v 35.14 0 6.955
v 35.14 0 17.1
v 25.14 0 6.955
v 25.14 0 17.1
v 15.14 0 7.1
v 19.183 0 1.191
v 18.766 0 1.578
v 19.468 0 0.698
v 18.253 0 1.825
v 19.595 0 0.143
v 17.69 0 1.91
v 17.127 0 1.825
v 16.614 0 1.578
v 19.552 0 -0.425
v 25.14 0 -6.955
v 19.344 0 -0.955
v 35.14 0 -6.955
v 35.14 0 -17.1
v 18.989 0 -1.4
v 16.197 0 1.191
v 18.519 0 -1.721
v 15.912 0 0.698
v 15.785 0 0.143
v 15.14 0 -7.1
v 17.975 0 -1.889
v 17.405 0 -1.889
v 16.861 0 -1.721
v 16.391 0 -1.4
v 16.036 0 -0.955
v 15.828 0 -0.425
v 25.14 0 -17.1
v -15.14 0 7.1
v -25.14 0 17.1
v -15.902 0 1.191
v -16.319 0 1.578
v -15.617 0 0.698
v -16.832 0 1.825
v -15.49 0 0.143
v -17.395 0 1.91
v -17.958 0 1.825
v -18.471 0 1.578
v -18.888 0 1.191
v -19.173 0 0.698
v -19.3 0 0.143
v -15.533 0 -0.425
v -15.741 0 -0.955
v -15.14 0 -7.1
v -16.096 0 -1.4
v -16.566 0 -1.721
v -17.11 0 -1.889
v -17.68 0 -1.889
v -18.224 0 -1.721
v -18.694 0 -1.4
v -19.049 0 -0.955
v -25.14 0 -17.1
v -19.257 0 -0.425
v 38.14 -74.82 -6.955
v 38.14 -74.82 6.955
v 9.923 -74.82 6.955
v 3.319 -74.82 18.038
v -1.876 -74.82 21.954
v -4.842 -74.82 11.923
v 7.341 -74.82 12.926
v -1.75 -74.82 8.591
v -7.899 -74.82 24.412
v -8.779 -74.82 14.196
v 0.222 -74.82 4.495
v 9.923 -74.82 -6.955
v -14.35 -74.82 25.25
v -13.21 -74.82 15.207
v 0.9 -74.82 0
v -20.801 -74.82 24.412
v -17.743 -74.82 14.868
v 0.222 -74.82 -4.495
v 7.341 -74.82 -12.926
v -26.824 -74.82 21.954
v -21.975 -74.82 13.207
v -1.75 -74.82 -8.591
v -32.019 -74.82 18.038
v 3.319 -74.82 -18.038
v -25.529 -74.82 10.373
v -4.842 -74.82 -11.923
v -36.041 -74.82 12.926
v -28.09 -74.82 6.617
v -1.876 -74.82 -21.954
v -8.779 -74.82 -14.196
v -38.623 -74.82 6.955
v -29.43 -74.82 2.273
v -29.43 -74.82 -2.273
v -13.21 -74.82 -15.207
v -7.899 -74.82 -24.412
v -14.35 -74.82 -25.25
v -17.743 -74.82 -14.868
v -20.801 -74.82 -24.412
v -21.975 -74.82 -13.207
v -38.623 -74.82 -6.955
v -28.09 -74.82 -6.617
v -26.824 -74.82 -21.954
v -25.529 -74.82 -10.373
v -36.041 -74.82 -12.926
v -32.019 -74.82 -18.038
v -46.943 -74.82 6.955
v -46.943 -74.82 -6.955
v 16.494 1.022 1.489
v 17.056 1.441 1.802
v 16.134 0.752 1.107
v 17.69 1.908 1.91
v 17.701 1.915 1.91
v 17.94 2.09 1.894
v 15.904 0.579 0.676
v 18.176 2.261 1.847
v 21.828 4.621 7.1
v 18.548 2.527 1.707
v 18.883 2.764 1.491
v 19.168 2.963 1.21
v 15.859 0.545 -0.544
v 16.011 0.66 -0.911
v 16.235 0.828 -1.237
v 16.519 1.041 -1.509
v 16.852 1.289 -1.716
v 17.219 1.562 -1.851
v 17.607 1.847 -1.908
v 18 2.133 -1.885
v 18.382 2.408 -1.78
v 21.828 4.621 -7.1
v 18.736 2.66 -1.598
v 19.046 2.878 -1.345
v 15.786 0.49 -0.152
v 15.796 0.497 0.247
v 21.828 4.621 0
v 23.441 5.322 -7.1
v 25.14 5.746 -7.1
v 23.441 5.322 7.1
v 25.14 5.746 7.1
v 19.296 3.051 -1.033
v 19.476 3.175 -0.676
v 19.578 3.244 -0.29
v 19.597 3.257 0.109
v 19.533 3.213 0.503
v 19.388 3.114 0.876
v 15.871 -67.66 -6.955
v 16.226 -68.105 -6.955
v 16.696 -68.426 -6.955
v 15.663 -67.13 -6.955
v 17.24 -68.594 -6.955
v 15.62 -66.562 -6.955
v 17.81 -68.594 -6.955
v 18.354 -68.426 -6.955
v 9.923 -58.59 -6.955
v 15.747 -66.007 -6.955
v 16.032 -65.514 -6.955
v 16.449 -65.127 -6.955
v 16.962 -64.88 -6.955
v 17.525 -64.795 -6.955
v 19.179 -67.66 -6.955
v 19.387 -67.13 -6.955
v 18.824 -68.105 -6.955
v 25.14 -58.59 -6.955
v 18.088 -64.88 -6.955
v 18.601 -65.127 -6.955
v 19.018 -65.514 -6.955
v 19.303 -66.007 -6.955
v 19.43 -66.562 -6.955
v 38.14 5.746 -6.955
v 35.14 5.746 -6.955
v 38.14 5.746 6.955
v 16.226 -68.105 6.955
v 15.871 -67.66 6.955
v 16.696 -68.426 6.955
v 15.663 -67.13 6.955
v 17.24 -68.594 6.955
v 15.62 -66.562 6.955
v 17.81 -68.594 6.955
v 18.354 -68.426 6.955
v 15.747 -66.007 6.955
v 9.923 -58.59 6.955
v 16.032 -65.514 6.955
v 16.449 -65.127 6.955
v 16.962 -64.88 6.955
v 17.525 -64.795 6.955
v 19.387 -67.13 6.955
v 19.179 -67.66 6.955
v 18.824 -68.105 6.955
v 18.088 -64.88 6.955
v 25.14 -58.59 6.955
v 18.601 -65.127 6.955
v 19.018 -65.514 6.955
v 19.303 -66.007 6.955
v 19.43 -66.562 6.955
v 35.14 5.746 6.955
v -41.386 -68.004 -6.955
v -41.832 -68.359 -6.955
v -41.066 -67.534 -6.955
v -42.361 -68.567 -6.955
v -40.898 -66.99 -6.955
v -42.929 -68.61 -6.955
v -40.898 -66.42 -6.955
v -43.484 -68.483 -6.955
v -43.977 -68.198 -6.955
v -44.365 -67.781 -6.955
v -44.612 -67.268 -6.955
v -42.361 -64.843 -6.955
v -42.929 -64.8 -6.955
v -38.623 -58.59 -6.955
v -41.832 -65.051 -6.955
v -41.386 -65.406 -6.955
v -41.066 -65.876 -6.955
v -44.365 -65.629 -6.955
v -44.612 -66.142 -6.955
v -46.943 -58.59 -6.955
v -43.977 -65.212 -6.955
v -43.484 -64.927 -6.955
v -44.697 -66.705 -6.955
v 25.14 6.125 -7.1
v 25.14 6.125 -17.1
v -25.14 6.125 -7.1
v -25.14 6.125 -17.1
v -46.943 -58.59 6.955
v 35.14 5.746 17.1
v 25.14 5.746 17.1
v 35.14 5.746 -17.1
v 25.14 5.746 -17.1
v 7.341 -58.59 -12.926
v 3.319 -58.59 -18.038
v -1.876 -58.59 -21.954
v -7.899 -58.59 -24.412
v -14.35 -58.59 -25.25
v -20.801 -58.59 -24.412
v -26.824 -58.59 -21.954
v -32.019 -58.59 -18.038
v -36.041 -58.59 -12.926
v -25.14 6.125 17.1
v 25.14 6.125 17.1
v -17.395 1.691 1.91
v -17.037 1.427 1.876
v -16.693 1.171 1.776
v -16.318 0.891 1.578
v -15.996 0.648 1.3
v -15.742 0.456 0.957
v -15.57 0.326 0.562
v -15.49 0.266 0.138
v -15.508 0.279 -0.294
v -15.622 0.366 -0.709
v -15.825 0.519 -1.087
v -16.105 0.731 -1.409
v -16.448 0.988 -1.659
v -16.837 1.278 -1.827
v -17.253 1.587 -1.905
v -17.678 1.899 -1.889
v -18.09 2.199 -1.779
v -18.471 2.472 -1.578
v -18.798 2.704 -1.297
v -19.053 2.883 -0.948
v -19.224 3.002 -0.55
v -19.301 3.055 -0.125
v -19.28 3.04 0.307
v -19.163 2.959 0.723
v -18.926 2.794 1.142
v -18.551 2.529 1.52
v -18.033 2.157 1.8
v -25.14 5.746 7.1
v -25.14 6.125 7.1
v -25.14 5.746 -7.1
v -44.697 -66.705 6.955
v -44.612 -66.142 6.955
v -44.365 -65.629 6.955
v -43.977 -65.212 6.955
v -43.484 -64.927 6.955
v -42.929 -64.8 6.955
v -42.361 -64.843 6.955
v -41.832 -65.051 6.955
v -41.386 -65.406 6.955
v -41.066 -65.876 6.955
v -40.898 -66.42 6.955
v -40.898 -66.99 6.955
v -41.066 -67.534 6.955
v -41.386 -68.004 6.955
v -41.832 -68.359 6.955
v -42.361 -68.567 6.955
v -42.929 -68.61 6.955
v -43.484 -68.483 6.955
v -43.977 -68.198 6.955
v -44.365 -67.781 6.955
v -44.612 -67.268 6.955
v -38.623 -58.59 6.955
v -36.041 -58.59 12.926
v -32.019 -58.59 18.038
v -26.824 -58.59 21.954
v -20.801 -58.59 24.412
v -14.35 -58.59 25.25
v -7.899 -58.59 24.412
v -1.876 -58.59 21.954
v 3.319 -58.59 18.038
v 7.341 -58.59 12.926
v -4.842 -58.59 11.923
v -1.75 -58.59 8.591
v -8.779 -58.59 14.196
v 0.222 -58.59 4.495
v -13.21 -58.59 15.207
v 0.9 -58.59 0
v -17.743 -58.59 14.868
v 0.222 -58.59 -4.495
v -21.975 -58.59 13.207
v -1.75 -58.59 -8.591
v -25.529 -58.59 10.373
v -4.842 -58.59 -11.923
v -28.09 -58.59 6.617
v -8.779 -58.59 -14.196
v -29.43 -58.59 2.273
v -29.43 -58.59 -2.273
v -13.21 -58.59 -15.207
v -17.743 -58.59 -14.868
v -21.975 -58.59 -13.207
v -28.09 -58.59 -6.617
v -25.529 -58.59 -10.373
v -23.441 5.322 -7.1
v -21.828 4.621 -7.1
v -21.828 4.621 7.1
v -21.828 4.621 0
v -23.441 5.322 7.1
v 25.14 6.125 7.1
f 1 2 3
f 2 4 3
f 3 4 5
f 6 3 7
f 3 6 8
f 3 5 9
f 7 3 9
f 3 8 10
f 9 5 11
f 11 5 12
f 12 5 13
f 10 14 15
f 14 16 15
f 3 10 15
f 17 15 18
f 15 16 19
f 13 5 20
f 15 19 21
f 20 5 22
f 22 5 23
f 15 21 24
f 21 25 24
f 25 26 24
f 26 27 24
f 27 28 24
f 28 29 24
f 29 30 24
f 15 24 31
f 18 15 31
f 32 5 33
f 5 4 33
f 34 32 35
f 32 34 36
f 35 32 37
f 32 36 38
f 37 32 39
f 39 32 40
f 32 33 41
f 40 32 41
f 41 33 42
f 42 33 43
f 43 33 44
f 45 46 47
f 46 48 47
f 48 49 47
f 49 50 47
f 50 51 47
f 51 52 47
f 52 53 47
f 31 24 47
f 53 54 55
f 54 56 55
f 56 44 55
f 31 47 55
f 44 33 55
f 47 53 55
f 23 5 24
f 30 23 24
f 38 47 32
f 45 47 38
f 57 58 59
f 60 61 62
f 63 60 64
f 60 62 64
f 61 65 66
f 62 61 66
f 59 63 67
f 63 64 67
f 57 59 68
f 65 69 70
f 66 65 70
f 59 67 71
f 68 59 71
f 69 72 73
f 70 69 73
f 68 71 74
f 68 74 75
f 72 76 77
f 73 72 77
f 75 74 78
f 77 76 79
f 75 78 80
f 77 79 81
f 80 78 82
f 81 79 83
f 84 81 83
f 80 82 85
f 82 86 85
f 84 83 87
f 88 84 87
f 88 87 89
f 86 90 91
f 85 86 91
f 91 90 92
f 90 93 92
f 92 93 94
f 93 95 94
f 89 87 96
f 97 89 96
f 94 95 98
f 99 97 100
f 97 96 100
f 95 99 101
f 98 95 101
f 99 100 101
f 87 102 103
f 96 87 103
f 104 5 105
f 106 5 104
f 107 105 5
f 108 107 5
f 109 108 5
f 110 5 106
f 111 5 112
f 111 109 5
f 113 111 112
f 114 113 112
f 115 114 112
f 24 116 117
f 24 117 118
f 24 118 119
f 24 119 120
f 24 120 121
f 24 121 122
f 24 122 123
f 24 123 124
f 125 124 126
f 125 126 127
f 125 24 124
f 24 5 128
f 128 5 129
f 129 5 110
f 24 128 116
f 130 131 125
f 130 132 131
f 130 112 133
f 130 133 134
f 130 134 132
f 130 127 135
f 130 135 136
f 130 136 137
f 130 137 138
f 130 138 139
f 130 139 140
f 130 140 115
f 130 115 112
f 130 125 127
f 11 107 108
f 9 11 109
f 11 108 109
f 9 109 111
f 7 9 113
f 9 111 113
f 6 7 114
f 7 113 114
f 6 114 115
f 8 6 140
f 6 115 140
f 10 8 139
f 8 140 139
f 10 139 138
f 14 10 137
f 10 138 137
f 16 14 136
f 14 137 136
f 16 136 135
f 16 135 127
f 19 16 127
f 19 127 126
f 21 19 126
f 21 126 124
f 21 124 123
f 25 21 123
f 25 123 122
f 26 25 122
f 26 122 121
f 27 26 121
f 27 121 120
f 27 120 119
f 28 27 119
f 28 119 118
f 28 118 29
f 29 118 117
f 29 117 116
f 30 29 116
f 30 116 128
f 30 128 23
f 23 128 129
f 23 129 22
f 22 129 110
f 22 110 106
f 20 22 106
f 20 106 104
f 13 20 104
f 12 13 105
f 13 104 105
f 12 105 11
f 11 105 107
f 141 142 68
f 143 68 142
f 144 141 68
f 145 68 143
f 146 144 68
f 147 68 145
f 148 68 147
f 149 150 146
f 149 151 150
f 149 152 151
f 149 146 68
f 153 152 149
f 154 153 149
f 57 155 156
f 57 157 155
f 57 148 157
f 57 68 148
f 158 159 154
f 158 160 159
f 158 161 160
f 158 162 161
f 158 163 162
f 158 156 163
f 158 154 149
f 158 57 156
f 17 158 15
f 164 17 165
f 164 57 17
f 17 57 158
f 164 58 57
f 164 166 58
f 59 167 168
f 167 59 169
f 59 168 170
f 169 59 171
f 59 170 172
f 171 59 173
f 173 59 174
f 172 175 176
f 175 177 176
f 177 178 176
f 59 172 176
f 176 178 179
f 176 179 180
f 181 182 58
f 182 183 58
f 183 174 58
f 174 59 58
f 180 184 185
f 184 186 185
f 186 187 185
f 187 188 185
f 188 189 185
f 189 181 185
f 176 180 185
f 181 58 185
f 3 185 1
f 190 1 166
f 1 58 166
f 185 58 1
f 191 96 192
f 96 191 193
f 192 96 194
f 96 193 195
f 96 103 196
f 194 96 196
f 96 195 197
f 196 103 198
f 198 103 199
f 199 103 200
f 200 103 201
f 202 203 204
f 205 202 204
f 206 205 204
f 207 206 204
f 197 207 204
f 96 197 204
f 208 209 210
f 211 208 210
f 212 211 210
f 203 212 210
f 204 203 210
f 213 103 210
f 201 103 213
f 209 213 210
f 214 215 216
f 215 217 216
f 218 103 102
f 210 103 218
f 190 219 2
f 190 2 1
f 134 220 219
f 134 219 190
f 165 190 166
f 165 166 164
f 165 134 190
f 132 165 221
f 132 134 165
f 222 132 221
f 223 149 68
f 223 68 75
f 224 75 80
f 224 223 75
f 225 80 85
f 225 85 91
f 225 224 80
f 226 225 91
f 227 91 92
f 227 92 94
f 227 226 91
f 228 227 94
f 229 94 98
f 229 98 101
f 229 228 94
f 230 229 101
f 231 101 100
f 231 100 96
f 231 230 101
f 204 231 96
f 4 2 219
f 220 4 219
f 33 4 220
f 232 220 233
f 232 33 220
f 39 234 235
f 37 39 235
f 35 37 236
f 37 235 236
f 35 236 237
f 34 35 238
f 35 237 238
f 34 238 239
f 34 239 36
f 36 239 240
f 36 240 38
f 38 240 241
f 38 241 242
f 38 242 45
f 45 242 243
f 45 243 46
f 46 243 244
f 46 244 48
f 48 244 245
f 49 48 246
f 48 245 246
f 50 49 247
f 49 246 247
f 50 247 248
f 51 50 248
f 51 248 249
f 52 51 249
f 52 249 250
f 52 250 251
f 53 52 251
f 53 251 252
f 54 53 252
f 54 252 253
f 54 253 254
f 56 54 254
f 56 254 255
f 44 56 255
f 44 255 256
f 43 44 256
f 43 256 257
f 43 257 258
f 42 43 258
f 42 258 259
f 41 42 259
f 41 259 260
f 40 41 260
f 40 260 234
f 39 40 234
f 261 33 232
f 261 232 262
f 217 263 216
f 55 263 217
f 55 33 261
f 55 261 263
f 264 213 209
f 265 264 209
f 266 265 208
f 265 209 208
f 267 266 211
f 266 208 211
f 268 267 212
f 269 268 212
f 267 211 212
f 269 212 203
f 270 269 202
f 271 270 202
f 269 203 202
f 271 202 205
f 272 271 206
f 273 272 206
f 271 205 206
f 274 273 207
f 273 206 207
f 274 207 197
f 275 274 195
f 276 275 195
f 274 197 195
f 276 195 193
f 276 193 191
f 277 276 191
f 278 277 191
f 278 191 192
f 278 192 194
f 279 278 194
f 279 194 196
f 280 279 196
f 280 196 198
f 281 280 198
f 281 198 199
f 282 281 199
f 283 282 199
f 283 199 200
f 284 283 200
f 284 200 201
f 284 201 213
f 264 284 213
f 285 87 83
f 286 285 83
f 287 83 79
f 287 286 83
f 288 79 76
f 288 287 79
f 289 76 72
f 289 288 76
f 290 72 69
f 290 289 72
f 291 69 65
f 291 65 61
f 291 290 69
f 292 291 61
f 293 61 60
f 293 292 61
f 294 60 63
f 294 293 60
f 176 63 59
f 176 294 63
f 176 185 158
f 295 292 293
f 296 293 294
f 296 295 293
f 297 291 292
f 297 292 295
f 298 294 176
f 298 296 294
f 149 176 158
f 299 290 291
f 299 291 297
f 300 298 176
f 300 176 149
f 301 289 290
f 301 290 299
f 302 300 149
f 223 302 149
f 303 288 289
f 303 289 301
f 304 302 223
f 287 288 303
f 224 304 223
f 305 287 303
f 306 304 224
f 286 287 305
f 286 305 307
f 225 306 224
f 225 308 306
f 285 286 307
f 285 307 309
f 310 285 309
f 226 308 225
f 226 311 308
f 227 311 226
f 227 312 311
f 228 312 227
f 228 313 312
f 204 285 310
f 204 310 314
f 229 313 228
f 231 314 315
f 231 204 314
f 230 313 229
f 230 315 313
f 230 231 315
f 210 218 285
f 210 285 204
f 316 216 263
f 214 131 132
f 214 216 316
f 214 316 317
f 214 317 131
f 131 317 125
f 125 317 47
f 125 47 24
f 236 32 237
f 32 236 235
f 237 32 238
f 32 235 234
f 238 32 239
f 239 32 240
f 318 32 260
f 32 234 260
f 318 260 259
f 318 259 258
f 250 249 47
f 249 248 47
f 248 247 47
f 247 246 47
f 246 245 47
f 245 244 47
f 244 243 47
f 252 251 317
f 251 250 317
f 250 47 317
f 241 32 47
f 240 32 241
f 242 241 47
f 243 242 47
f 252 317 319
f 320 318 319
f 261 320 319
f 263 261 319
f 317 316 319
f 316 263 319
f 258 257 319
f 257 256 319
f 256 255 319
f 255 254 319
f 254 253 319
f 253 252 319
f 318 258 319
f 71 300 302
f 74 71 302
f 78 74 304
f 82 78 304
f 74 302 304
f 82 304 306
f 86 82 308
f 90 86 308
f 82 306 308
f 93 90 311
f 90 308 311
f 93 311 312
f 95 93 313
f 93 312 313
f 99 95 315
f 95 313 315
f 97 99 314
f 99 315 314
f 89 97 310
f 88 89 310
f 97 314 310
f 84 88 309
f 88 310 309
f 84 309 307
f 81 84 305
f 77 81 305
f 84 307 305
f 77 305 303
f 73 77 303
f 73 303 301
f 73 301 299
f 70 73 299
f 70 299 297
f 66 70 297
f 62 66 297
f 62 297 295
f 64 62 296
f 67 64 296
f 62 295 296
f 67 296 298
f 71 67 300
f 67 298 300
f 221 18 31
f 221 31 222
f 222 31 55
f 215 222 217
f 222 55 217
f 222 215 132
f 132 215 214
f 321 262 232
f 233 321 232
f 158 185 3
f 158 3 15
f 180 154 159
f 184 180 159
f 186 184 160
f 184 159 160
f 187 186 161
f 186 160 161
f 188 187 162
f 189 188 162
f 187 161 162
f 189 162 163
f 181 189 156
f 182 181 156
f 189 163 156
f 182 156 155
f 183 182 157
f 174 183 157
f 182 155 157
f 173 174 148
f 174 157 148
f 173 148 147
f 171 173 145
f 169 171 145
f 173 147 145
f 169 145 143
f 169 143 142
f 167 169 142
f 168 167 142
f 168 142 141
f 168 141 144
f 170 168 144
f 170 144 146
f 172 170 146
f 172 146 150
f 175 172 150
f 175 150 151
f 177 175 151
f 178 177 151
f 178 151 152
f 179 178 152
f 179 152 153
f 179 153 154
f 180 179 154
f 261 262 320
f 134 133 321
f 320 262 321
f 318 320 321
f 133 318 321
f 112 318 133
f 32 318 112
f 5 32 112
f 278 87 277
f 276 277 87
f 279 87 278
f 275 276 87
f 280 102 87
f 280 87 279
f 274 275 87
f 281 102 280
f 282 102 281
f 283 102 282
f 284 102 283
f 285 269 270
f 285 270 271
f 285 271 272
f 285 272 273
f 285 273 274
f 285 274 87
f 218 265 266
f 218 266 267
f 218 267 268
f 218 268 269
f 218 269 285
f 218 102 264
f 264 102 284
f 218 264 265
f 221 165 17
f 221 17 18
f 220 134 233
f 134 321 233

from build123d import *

# Parameters (mm, degrees)
SKETCH_1_W                = 50.28
SKETCH_1_H                = 34.2
SKETCH_1_W_2              = 30.28
SKETCH_1_H_2              = 14.2
EXTRUDE_1_DEPTH           = 12.25
SKETCH_4_W                = 13
SKETCH_4_H                = 13.91
EXTRUDE_1_2_DEPTH         = 74.82
SKETCH_5_W                = 13.91
SKETCH_5_H                = 16.23
EXTRUDE_2_DEPTH           = 16
SKETCH_7_R                = 25.25
SKETCH_7_R_2              = 15.25
EXTRUDE_2_2_DEPTH         = 16.23
SKETCH_15_R               = 1.91
CUT_EXTRUDE_6_DEPTH       = 97.964478439
SKETCH_18_W               = 49.344544624
SKETCH_18_H               = 6.125
CUT_EXTRUDE_8_DEPTH       = 101.789238284
SKETCH_19_W               = 34.2
SKETCH_19_H               = 6.125
CUT_EXTRUDE_9_DEPTH       = 10
SKETCH_21_R               = 1.91
CUT_EXTRUDE_10_DEPTH      = 10
SKETCH_20_R               = 1.91
CUT_EXTRUDE_11_DEPTH      = 10
FILLET_START              = -7.1
FILLET_1_DEPTH            = 14.2
FILLET_2_DEPTH            = 14.2
SKETCH_29_W               = 13.91
SKETCH_29_H               = 74.82
EXTRUDE_5_DEPTH           = 10
SKETCH_30_W               = 10
SKETCH_30_H               = 58.59
CUT_EXTRUDE_13_DEPTH      = 97.964478439
SKETCH_32_W               = 34.2
SKETCH_32_H               = 5.745736365
EXTRUDE_6_DEPTH           = 10
CUT_EXTRUDE_16_DEPTH      = 50
CUT_EXTRUDE_16_DEPTH_BACK = 50
SKETCH_38_W               = 116.985630298
SKETCH_38_H               = 80.538350638
SKETCH_41_W               = 13.91
SKETCH_41_H               = 5.745736365
EXTRUDE_7_DEPTH           = 3
SKETCH_42_W               = 13
SKETCH_42_H               = 13.91
EXTRUDE_8_DEPTH           = 74.82
SKETCH_43_W               = 13.91
SKETCH_43_H               = 16.23
EXTRUDE_9_DEPTH           = 15.22
SKETCH_44_R               = 1.91
CUT_EXTRUDE_17_DEPTH      = 15.22
SKETCH_46_R               = 25.25
SKETCH_46_R_2             = 15.25
EXTRUDE_6_2_DEPTH         = 16.23
EXTRUDE_10_DEPTH          = 7.22
EXTRUDE_10_DEPTH_BACK     = 10
SKETCH_47_W               = 13.91
SKETCH_47_H               = 16.23
SKETCH_50_W               = 3.056753925
SKETCH_50_H               = 16.23
CUT_EXTRUDE_18_DEPTH      = 96.578211037
SKETCH_51_R               = 1.91
CUT_EXTRUDE_19_DEPTH      = 95.015226304


with BuildPart() as part:
    # 草圖1 → Extrude 1 (new body)
    with BuildSketch(Plane(origin=(0, 0, 0), x_dir=(1, 0, 0), z_dir=(0, 1, 0))):
        Rectangle(SKETCH_1_W, SKETCH_1_H)
        Rectangle(SKETCH_1_W_2, SKETCH_1_H_2, mode=Mode.SUBTRACT)
    extrude(amount=EXTRUDE_1_DEPTH)

    # 草圖4 → Extrude 1 2 (add)
    with BuildSketch(Plane.XZ):
        with Locations((18.64, 0)):
            Rectangle(SKETCH_4_W, SKETCH_4_H)
    extrude(amount=EXTRUDE_1_2_DEPTH)

    # 草圖5 → Extrude 2 (add)
    with BuildSketch(Plane.ZY.offset(-12.14)):
        with Locations((0, -66.705)):
            Rectangle(SKETCH_5_W, SKETCH_5_H)
    extrude(amount=EXTRUDE_2_DEPTH)

    # 草圖7 → Extrude 2 2 (add)
    with BuildSketch(Plane(origin=(3.626674765, -74.82, 0), x_dir=(1, 0, 0), z_dir=(0, -1, 0))):
        with Locations((-30.978154344, 0)):
            Circle(SKETCH_7_R)
        with Locations((-30.978154344, 0)):
            Circle(SKETCH_7_R_2, mode=Mode.SUBTRACT)
    extrude(amount=-EXTRUDE_2_2_DEPTH)

    # 草圖15 → 除料-伸長6 (cut, through all)
    with BuildSketch(Plane(origin=(0, 0, -6.955), x_dir=(-1, 0, 0), z_dir=(0, 0, -1))):
        with Locations((-4.530883248, -66.705)):
            Circle(SKETCH_15_R)
    extrude(amount=-CUT_EXTRUDE_6_DEPTH, mode=Mode.SUBTRACT)

    # 草圖18 → 除料-伸長8 (cut, through all)
    with BuildSketch(Plane(origin=(0, 0, -17.1), x_dir=(-1, 0, 0), z_dir=(0, 0, -1))):
        with Locations((0.467727688, 9.1875)):
            Rectangle(SKETCH_18_W, SKETCH_18_H)
    extrude(amount=-CUT_EXTRUDE_8_DEPTH, mode=Mode.SUBTRACT)

    # 草圖19 → 除料-伸長9 (cut)
    with BuildSketch(Plane.ZY.offset(-24.204544624)):
        with Locations((0, 9.1875)):
            Rectangle(SKETCH_19_W, SKETCH_19_H)
    extrude(amount=-CUT_EXTRUDE_9_DEPTH, mode=Mode.SUBTRACT)

    # 草圖21 → 除料-伸長10 (cut)
    with BuildSketch(Plane(origin=(0, 6.125, 0), x_dir=(1, 0, 0), z_dir=(0, 1, 0))):
        with Locations(Location((17.69, 0, 0), (0, 0, 270))):
            Circle(SKETCH_21_R)
    extrude(amount=-CUT_EXTRUDE_10_DEPTH, mode=Mode.SUBTRACT)

    # 草圖20 → 除料-伸長11 (cut)
    with BuildSketch(Plane(origin=(0, 6.125, 0), x_dir=(1, 0, 0), z_dir=(0, 1, 0))):
        with Locations(Location((-17.395, 0, 0), (0, 0, 270))):
            Circle(SKETCH_20_R)
    extrude(amount=-CUT_EXTRUDE_11_DEPTH, mode=Mode.SUBTRACT)

    # 圓角1: read off the stored shape, not the designer's step
    # 圓角1 outline → 圓角1 (cut)
    with BuildSketch(Plane.XY.offset(FILLET_START)):
        with BuildLine():
            add(Edge.make_bspline(
                [(-15.14, 0), (-21.974170252, 5.199829476), (-25.14, 5.745736365)],
                knots=[0, 0, 0, 0.664102345, 0.664102345, 0.664102345], degree=2, weights=[1, 2.223777218, 1.822127795]))
            Line((-15.14, 0), (-15.14, 6.125))
            Line((-15.14, 6.125), (-25.14, 6.125))
            Line((-25.14, 6.125), (-25.14, 5.745736365))
        make_face()
    extrude(amount=FILLET_1_DEPTH, mode=Mode.SUBTRACT)

    # 圓角2: read off the stored shape, not the designer's step
    # 圓角2 outline → 圓角2 (cut)
    with BuildSketch(Plane.XY.offset(FILLET_START)):
        with BuildLine():
            Line((15.14, 6.125), (15.14, 0))
            add(Edge.make_bspline(
                [(15.14, 0), (21.974170252, 5.199829476), (25.14, 5.745736365)],
                knots=[0, 0, 0, 0.664102345, 0.664102345, 0.664102345], degree=2, weights=[1, 2.223777218, 1.822127795]))
            Line((25.14, 5.745736365), (25.14, 6.125))
            Line((25.14, 6.125), (15.14, 6.125))
        make_face()
    extrude(amount=FILLET_2_DEPTH, mode=Mode.SUBTRACT)

    # 草圖29 → 填料-伸長5 (add)
    with BuildSketch(Plane(origin=(25.14, 0, 0), x_dir=(0, 0, -1), z_dir=(1, 0, 0))):
        with Locations((0, -37.41)):
            Rectangle(SKETCH_29_W, SKETCH_29_H)
    extrude(amount=EXTRUDE_5_DEPTH)

    # 草圖30 → 除料-伸長13 (cut, through all)
    with BuildSketch(Plane.XY.offset(6.955)):
        with Locations((17.14, -29.295)):
            Rectangle(SKETCH_30_W, SKETCH_30_H)
    extrude(amount=-CUT_EXTRUDE_13_DEPTH, mode=Mode.SUBTRACT)

    # 草圖32 → Extrude 6 (add)
    with BuildSketch(Plane(origin=(25.14, 0, 0), x_dir=(0, 0, -1), z_dir=(1, 0, 0))):
        with Locations((0, 2.872868182)):
            Rectangle(SKETCH_32_W, SKETCH_32_H)
    extrude(amount=EXTRUDE_6_DEPTH)

    # 草圖38 → 除料-伸長16 (cut, two sides: drawn at the far end of the back side and taken through both)
    with BuildSketch(Plane(origin=(0, 0, -6.955), x_dir=(-1, 0, 0), z_dir=(0, 0, -1)).offset(-CUT_EXTRUDE_16_DEPTH_BACK)):
        with Locations((7.268869252, -40.269175319)):
            Rectangle(SKETCH_38_W, SKETCH_38_H)
    extrude(amount=CUT_EXTRUDE_16_DEPTH + CUT_EXTRUDE_16_DEPTH_BACK, mode=Mode.SUBTRACT)

    # 草圖41 → 填料-伸長7 (add)
    with BuildSketch(Plane(origin=(35.14, 0, 0), x_dir=(0, 0, -1), z_dir=(1, 0, 0))):
        with Locations((0, 2.872868182)):
            Rectangle(SKETCH_41_W, SKETCH_41_H)
    extrude(amount=EXTRUDE_7_DEPTH)

    # 草圖42 → 填料-伸長8 (add)
    with BuildSketch(Plane(origin=(0, 0, 0), x_dir=(-1, 0, 0), z_dir=(0, -1, 0))):
        with Locations((-31.64, 0)):
            Rectangle(SKETCH_42_W, SKETCH_42_H)
    extrude(amount=EXTRUDE_8_DEPTH)

    # 草圖43 → 填料-伸長9 (add)
    with BuildSketch(Plane.ZY.offset(-25.14)):
        with Locations((0, -66.705)):
            Rectangle(SKETCH_43_W, SKETCH_43_H)
    extrude(amount=EXTRUDE_9_DEPTH)

    # 草圖44 → 除料-伸長17 (cut)
    with BuildSketch(Plane(origin=(0, 0, -6.955), x_dir=(-1, 0, 0), z_dir=(0, 0, -1))):
        with Locations(Location((-17.524895264, -66.705, 0), (0, 0, 90))):
            Circle(SKETCH_44_R)
    extrude(amount=-CUT_EXTRUDE_17_DEPTH, mode=Mode.SUBTRACT)

    # 草圖46 → Extrude 6 2 (add)
    with BuildSketch(Plane(origin=(0, -58.59, 0), x_dir=(1, 0, 0), z_dir=(0, 1, 0))):
        with Locations((-14.35, 0)):
            Circle(SKETCH_46_R)
        with Locations((-14.35, 0)):
            Circle(SKETCH_46_R_2, mode=Mode.SUBTRACT)
    extrude(amount=-EXTRUDE_6_2_DEPTH)

    # 草圖47 → 填料-伸長10 (add, two sides: drawn at the far end of the back side and taken through both)
    with BuildSketch(Plane(origin=(-40, 0, 0), x_dir=(0, 0, -1), z_dir=(1, 0, 0)).offset(-EXTRUDE_10_DEPTH_BACK)):
        with Locations((0, -66.705)):
            Rectangle(SKETCH_47_W, SKETCH_47_H)
    extrude(amount=EXTRUDE_10_DEPTH + EXTRUDE_10_DEPTH_BACK)

    # 草圖50 → 除料-伸長18 (cut, through all)
    with BuildSketch(Plane(origin=(0, 0, -6.955), x_dir=(-1, 0, 0), z_dir=(0, 0, -1))):
        with Locations((48.471623038, -66.705)):
            Rectangle(SKETCH_50_W, SKETCH_50_H)
    extrude(amount=-CUT_EXTRUDE_18_DEPTH, mode=Mode.SUBTRACT)

    # 草圖51 → 除料-伸長19 (cut, through all)
    with BuildSketch(Plane(origin=(0, 0, -6.955), x_dir=(-1, 0, 0), z_dir=(0, 0, -1))):
        with Locations((42.786508152, -66.705)):
            Circle(SKETCH_51_R)
    extrude(amount=-CUT_EXTRUDE_19_DEPTH, mode=Mode.SUBTRACT)


solid = part.part
